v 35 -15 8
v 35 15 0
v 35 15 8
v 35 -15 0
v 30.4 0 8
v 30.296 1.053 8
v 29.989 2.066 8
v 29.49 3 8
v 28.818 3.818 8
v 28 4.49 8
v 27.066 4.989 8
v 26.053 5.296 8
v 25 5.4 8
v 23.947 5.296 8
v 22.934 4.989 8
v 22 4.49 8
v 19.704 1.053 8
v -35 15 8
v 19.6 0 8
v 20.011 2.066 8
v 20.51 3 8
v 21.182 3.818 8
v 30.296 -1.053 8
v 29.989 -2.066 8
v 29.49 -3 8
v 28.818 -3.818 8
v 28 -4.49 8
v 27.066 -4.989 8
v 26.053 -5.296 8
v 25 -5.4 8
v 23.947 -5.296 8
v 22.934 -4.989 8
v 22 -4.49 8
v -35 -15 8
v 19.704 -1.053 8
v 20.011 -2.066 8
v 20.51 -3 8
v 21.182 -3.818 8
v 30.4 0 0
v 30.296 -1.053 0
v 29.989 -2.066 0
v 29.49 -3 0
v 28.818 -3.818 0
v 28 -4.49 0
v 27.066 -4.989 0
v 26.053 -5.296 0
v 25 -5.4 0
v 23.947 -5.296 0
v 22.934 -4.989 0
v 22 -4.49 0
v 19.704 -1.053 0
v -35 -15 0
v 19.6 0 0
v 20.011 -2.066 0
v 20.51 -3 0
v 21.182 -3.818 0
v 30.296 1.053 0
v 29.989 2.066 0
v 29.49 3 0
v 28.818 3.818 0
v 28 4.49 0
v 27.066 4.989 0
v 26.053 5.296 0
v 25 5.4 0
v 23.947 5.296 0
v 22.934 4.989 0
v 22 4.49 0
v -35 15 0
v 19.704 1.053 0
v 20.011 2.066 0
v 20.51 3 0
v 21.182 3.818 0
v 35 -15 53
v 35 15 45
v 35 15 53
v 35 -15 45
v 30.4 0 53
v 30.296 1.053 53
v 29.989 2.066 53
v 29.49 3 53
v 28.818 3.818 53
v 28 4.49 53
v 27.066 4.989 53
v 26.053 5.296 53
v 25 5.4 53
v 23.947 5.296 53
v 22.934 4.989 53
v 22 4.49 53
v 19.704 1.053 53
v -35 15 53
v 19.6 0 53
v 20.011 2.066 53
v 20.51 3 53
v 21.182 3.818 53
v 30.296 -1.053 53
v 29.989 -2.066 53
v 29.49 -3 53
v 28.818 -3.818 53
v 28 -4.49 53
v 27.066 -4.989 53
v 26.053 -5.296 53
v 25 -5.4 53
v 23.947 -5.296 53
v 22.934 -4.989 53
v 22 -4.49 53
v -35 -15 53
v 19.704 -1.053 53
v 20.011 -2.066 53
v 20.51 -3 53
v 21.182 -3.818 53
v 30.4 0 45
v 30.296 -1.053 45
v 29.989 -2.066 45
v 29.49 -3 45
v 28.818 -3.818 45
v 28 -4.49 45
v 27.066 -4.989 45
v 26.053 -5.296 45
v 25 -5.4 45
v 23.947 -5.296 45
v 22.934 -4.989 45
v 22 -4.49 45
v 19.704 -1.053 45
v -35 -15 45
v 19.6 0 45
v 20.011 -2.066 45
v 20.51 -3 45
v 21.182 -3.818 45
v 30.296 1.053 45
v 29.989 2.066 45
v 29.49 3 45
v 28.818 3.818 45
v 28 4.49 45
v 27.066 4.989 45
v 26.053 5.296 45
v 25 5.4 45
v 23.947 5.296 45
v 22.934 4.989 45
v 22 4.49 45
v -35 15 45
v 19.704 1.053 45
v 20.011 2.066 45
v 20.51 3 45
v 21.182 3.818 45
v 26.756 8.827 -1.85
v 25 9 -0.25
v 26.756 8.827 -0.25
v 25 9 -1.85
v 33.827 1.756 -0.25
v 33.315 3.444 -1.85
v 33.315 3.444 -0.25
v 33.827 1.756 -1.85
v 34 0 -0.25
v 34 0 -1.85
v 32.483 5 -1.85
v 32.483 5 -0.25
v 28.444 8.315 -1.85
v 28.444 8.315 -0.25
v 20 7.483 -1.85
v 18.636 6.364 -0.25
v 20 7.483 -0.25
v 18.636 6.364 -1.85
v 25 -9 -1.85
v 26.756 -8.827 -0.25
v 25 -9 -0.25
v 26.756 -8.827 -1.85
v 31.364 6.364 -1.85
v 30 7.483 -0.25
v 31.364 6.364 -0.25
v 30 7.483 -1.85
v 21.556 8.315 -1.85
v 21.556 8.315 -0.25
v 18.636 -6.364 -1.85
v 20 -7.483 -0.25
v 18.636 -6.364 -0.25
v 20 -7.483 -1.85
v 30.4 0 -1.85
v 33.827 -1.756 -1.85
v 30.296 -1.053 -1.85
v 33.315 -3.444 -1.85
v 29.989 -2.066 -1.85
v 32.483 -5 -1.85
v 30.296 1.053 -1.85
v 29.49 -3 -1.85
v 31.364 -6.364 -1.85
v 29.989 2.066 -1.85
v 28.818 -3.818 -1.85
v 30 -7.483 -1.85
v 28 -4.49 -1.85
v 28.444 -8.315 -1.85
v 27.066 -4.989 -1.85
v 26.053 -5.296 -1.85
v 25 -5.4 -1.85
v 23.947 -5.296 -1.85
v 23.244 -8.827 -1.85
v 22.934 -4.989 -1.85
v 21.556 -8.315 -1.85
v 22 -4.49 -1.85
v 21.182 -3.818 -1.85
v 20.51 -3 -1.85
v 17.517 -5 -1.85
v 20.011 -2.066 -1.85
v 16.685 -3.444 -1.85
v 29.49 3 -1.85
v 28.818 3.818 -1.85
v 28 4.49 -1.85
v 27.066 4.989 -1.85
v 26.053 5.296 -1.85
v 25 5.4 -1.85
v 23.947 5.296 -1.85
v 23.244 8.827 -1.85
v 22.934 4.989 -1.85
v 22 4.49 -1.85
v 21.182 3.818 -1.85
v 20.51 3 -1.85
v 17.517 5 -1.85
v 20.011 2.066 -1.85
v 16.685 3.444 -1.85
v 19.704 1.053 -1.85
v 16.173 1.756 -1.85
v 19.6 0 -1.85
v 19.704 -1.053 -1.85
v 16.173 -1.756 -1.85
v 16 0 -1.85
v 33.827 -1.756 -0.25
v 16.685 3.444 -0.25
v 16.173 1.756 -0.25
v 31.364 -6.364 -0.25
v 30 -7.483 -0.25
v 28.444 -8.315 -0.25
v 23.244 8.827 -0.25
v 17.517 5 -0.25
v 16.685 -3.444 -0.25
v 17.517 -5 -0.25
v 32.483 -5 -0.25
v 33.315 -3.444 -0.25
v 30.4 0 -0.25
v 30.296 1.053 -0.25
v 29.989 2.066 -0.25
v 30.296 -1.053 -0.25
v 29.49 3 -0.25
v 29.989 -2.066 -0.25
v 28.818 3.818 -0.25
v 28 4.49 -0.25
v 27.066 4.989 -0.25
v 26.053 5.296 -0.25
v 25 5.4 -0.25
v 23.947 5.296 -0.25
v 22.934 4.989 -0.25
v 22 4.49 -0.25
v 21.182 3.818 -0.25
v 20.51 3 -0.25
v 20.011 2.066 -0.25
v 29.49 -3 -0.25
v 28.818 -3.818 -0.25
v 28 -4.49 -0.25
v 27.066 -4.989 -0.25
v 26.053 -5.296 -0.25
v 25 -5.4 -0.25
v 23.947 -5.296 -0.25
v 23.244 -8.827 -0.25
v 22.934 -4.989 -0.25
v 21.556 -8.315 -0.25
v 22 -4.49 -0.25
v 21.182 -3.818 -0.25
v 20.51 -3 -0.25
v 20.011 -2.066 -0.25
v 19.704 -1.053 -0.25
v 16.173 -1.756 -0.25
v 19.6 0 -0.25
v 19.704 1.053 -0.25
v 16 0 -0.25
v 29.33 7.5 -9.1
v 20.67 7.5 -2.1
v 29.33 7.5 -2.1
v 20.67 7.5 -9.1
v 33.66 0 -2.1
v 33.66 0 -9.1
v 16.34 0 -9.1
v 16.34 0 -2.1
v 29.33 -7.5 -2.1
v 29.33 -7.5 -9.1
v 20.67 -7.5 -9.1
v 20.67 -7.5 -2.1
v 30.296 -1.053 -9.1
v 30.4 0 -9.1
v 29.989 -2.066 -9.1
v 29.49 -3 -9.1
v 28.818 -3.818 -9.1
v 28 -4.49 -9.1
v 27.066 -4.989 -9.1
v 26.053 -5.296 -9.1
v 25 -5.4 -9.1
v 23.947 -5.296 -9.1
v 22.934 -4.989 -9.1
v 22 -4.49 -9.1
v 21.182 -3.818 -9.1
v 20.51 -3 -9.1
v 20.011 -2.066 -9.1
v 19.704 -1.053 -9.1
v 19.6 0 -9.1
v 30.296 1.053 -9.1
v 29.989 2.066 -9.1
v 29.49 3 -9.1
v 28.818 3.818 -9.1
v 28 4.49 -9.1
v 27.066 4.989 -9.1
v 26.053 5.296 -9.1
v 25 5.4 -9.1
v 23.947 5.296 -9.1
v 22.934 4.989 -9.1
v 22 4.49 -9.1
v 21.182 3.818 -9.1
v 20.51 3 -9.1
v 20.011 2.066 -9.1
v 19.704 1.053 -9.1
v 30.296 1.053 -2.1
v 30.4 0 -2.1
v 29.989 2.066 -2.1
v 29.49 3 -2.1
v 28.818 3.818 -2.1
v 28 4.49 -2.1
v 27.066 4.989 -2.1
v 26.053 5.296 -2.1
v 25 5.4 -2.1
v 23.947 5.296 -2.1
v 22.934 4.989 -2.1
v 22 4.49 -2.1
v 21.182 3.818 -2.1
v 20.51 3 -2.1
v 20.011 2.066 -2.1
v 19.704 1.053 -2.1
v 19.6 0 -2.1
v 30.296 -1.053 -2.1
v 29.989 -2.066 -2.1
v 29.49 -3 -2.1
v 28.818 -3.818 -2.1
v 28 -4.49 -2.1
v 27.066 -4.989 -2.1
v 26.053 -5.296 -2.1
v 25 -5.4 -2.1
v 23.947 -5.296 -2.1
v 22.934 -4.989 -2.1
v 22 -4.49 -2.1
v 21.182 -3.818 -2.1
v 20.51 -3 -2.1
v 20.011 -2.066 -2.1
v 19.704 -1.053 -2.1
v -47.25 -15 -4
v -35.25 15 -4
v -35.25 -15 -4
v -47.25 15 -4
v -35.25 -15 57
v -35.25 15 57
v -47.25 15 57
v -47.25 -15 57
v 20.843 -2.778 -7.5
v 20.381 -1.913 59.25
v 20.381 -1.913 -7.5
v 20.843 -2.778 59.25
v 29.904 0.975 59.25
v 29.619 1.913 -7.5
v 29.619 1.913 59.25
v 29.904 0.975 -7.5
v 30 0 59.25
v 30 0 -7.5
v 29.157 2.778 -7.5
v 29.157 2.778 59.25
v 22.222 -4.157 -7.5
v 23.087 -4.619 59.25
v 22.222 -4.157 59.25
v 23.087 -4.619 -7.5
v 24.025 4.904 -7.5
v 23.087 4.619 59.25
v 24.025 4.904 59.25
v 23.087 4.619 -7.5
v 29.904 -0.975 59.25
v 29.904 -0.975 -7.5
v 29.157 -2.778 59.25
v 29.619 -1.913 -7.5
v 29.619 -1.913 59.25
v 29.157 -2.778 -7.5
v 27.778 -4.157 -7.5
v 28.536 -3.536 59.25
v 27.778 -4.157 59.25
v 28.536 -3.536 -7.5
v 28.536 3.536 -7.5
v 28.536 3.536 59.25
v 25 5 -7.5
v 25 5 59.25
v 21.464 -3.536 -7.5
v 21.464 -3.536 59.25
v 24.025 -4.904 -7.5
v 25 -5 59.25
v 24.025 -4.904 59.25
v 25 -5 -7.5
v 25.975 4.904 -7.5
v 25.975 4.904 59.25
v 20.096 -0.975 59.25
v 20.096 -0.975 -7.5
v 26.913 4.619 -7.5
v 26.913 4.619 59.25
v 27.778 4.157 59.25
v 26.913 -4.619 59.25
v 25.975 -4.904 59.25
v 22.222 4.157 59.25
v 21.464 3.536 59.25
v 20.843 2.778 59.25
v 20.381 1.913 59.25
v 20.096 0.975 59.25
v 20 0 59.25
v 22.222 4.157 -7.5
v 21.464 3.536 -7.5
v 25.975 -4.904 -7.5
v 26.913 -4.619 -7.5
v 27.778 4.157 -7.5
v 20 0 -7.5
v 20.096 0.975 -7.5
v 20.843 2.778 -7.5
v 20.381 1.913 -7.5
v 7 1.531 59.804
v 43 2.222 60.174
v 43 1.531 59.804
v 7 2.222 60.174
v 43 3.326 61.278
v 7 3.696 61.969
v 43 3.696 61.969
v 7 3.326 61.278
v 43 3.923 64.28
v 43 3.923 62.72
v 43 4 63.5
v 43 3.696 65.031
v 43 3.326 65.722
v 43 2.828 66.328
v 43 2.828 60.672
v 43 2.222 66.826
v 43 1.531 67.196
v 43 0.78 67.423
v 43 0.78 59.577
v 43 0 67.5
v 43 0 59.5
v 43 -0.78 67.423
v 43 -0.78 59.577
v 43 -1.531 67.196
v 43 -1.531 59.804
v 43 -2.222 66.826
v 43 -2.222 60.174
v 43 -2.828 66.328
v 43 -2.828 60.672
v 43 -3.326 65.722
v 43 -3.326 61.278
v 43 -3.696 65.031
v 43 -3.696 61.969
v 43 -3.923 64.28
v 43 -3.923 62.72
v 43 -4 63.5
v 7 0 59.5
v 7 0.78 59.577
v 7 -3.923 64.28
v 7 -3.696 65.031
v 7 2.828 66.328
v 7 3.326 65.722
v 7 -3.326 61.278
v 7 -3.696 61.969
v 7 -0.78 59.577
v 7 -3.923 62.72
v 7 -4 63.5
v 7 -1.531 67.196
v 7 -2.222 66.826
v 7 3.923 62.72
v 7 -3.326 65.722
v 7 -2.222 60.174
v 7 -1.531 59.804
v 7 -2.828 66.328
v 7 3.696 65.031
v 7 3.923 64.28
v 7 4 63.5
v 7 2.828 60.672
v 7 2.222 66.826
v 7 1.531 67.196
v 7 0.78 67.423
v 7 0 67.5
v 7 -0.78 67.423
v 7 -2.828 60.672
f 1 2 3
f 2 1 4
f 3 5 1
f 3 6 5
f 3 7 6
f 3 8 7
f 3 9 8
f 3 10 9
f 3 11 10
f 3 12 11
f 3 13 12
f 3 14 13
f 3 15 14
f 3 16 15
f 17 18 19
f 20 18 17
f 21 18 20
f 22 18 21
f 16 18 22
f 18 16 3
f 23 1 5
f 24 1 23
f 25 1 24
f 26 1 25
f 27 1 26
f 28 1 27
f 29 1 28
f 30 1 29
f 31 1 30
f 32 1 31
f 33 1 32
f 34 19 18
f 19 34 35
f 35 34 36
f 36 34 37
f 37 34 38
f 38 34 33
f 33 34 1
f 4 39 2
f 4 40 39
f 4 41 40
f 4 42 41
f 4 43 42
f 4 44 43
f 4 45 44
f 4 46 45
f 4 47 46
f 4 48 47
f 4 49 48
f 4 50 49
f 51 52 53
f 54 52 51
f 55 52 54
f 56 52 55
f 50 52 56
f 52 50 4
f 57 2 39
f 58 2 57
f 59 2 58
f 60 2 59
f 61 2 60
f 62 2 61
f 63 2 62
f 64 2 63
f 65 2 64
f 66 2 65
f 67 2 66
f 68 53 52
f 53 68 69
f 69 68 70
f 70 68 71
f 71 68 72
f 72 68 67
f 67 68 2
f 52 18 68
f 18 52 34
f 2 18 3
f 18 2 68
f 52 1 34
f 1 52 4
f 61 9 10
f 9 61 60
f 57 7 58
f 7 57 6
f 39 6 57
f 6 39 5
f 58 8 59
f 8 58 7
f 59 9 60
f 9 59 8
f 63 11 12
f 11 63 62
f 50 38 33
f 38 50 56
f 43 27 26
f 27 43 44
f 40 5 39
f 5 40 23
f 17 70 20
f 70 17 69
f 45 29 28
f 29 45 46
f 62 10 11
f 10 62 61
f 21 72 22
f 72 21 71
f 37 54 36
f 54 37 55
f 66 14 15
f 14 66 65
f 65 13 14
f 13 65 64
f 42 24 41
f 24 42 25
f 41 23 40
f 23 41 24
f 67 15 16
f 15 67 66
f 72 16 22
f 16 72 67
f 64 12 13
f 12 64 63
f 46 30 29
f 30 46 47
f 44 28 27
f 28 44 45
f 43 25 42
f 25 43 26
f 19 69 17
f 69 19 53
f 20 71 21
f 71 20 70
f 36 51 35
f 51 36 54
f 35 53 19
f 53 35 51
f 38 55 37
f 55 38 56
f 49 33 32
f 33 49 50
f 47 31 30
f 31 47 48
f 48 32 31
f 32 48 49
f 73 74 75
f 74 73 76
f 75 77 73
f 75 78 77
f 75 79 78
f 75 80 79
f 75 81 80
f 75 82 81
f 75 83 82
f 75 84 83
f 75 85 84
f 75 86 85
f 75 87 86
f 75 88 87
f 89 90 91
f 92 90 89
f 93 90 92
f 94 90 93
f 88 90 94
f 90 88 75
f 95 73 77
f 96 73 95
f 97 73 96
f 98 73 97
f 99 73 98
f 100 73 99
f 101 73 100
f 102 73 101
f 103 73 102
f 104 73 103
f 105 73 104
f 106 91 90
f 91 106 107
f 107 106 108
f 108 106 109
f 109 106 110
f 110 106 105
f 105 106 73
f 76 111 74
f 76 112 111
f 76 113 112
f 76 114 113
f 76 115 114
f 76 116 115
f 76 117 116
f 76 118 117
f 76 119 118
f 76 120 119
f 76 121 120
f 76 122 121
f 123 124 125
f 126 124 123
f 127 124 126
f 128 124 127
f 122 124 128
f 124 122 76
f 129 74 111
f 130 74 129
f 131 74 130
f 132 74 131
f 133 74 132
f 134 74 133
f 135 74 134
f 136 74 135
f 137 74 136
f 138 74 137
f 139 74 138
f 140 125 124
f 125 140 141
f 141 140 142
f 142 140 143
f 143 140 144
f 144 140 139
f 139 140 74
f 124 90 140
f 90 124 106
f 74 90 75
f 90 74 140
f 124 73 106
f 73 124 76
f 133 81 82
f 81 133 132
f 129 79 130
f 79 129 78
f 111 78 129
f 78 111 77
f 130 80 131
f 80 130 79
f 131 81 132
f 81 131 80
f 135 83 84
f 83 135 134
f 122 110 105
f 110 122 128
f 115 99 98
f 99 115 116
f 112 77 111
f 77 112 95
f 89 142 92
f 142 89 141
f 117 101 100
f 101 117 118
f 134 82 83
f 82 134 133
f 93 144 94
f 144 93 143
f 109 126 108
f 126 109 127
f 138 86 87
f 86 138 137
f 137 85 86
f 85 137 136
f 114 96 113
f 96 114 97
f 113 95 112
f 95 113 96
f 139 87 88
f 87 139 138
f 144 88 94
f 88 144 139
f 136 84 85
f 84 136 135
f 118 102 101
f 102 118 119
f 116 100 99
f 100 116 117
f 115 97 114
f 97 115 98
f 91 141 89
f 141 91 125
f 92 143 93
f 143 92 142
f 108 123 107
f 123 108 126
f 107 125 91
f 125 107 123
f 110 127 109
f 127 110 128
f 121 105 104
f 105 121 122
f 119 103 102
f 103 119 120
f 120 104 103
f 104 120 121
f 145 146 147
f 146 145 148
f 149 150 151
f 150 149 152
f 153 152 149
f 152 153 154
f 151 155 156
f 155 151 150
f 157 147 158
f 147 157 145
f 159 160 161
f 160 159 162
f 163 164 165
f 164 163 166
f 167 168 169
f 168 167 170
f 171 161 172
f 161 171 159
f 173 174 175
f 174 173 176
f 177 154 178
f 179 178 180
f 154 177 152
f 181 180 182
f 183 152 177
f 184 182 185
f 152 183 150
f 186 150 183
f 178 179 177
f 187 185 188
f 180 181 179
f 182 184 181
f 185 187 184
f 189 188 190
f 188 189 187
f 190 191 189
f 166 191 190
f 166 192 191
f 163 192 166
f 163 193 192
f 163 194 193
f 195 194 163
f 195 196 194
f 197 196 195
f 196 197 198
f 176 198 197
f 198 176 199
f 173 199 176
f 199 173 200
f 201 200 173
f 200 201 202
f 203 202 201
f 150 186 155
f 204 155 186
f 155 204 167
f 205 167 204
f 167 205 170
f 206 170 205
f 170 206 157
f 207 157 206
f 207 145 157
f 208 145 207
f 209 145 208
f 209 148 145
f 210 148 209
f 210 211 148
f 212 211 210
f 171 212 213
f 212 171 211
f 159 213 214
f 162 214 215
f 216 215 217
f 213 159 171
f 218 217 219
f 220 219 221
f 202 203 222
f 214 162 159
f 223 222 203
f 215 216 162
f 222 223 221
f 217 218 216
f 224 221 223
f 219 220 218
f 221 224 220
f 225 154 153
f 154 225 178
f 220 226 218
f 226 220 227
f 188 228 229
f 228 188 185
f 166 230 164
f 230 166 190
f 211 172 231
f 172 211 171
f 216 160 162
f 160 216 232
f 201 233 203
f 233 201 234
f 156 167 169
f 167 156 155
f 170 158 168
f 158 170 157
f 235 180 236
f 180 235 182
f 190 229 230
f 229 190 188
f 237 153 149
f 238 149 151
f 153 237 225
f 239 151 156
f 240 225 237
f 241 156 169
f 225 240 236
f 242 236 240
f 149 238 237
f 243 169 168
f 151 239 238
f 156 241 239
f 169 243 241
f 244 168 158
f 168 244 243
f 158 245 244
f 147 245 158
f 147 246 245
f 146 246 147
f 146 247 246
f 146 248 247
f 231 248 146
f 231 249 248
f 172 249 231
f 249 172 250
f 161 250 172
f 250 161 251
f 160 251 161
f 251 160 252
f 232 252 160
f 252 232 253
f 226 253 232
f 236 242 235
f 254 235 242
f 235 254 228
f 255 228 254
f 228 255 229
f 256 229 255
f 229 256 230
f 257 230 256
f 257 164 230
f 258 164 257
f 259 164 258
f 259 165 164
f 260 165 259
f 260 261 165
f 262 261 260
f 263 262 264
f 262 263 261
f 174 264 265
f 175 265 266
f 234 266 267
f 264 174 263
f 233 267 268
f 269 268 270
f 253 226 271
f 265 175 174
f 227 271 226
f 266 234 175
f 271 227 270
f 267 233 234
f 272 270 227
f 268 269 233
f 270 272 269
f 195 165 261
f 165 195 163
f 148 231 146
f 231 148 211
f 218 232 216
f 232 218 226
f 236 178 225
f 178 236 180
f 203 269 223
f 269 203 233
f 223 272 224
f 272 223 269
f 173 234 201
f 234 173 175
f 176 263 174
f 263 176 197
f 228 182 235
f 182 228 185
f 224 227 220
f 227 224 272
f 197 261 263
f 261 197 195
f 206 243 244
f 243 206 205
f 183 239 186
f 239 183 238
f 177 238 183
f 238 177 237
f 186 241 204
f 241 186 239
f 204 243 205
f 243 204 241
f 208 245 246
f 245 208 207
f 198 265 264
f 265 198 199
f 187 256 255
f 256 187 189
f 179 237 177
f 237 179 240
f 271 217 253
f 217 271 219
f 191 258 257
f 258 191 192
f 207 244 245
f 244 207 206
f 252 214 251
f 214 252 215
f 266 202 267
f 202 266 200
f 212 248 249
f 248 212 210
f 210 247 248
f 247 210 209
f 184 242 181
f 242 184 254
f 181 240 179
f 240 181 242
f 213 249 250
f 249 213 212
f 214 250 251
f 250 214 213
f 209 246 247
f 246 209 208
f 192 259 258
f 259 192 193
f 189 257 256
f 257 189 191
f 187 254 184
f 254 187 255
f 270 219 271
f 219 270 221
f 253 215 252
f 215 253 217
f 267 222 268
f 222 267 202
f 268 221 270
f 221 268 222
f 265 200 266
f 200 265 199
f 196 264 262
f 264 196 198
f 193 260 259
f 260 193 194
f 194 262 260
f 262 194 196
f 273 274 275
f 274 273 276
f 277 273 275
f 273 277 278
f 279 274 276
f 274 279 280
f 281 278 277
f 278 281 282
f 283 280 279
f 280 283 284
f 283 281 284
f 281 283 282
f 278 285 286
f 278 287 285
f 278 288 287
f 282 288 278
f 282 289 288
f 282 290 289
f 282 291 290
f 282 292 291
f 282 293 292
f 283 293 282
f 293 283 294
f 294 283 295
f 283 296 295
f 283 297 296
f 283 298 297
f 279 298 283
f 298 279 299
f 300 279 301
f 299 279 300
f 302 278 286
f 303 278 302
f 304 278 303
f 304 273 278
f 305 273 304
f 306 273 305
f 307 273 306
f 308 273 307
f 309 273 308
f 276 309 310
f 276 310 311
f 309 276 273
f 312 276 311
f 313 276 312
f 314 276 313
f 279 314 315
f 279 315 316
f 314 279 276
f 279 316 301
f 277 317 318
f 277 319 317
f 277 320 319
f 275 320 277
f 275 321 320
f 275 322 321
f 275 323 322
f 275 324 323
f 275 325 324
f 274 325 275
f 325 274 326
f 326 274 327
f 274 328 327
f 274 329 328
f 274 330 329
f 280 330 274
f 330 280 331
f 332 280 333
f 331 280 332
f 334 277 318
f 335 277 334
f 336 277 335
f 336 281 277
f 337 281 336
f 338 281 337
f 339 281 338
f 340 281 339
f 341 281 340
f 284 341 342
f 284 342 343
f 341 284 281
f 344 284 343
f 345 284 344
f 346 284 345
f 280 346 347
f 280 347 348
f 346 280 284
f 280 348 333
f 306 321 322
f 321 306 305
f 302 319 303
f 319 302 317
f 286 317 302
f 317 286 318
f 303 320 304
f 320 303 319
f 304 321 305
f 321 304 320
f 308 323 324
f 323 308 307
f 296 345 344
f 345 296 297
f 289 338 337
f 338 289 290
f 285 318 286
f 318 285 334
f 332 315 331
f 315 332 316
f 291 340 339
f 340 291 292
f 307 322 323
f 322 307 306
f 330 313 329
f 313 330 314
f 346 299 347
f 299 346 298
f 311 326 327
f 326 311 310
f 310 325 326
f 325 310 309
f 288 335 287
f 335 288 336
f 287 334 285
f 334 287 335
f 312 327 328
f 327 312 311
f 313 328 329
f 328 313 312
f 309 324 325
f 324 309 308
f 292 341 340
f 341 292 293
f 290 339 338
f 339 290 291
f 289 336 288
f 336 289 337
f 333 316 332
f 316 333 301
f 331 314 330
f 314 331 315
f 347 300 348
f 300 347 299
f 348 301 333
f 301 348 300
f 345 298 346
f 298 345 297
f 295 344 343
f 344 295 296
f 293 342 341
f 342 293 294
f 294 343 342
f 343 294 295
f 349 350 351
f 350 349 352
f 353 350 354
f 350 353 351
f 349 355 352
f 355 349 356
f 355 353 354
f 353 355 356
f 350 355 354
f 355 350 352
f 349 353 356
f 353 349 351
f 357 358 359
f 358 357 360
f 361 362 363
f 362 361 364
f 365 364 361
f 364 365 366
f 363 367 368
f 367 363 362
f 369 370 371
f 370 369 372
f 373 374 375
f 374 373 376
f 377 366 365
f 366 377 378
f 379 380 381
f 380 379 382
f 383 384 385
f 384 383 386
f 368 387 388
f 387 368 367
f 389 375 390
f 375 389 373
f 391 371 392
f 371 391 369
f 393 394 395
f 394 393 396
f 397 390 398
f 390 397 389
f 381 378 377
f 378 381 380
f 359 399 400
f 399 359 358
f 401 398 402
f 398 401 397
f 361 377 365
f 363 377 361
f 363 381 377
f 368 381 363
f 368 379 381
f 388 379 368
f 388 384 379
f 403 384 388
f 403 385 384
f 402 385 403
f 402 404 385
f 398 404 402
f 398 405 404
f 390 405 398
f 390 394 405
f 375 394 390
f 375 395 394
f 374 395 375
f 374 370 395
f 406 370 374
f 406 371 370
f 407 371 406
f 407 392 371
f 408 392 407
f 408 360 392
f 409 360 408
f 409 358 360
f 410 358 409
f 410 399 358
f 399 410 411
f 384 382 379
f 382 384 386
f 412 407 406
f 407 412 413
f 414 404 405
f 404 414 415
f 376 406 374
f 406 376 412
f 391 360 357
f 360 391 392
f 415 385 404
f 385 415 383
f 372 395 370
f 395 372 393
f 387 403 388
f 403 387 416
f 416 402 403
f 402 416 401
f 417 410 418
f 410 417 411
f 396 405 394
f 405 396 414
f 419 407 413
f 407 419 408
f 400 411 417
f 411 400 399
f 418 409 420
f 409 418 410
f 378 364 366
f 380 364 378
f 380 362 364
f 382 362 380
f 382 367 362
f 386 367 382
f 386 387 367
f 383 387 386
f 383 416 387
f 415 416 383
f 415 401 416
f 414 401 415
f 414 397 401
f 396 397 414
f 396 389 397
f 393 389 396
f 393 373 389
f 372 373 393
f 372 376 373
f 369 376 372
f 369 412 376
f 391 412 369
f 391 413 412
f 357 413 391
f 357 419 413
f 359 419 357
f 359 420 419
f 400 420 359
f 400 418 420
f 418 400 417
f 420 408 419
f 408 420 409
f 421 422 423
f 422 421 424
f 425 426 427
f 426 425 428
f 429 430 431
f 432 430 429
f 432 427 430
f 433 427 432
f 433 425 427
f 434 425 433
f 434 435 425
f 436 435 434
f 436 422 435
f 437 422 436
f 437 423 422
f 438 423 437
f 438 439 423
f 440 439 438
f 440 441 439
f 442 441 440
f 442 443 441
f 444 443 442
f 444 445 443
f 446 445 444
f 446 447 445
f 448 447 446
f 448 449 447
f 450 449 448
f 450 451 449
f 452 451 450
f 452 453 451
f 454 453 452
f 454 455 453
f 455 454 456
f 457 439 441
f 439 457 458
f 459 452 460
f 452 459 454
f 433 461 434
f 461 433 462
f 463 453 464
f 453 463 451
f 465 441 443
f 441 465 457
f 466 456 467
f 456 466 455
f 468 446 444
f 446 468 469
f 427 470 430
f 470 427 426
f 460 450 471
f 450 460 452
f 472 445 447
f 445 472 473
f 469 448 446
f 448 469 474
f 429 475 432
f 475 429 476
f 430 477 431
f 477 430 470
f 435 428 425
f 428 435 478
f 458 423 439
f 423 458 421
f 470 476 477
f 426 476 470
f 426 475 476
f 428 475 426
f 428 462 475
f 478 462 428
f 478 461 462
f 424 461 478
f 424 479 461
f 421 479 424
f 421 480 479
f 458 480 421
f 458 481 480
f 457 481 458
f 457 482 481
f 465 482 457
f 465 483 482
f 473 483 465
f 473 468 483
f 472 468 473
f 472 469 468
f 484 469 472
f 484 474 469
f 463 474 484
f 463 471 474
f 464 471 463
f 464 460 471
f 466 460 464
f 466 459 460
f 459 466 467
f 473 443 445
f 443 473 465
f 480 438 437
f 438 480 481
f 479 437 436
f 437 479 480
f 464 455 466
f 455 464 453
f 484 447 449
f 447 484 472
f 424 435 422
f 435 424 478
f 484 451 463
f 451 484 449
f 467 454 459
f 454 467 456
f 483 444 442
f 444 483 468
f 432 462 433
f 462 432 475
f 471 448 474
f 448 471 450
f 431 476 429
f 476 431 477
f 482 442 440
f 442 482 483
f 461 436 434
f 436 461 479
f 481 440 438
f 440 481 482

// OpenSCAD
$fn = 32;

// ------------------------------------------------------------------------
// C clamp: throat 45 mm, screw d10
// Every part is its own module, assembly() places every instance.
// ------------------------------------------------------------------------

// --- part 1 ---
module clamp_arm() {
  difference() {
    translate([-35, -15, 0]) cube([70, 30, 8]);
    translate([25, 0, -1]) cylinder(h = 10, d = 10.8);
  }
}

// --- part 2 ---
module clamp_spine() {
  difference() {
    translate([-30.5, -15, 0]) cube([61, 30, 12]);
  }
}

// --- part 3 ---
module clamp_screw() {
  translate([0, 0, -33.375]) cylinder(h = 66.75, d = 10);
}

// --- part 4 ---
module clamp_washer() {
  difference() {
      translate([0, 0, 0]) cylinder(h = 1.6, d = 18);
      translate([0, 0, -1]) cylinder(h = 3.6, d = 10.8);
    }
}

// --- part 5 ---
module clamp_nut() {
  difference() {
    linear_extrude(height = 7) polygon(points = [[8.66, 0], [4.33, 7.5], [-4.33, 7.5], [-8.66, 0], [-4.33, -7.5], [4.33, -7.5]]);
    translate([0, 0, -1]) cylinder(h = 9, d = 10.8);
  }
}

// --- part 6 ---
module tommy_bar() {
  translate([0, 0, -18]) cylinder(h = 36, d = 8);
}

// --- assembly ---
module assembly() {
  color([0.80, 0.24, 0.20]) translate([0, 0, 0]) rotate([0, 0, 0]) clamp_arm();
  color([0.20, 0.45, 0.75]) translate([0, 0, 45]) rotate([0, 0, 0]) clamp_arm();
  color([0.25, 0.62, 0.32]) translate([-47.25, 0, 26.5]) rotate([0, 90, 0]) clamp_spine();
  color([0.92, 0.70, 0.18]) translate([25, 0, 25.875]) rotate([0, 0, 0]) clamp_screw();
  color([0.58, 0.35, 0.70]) translate([25, 0, -1.85]) rotate([0, 0, 0]) clamp_washer();
  color([0.16, 0.66, 0.66]) translate([25, 0, -9.1]) rotate([0, 0, 0]) clamp_nut();
  color([0.85, 0.48, 0.18]) translate([25, 0, 63.5]) rotate([0, 90, 0]) tommy_bar();
}

assembly();
